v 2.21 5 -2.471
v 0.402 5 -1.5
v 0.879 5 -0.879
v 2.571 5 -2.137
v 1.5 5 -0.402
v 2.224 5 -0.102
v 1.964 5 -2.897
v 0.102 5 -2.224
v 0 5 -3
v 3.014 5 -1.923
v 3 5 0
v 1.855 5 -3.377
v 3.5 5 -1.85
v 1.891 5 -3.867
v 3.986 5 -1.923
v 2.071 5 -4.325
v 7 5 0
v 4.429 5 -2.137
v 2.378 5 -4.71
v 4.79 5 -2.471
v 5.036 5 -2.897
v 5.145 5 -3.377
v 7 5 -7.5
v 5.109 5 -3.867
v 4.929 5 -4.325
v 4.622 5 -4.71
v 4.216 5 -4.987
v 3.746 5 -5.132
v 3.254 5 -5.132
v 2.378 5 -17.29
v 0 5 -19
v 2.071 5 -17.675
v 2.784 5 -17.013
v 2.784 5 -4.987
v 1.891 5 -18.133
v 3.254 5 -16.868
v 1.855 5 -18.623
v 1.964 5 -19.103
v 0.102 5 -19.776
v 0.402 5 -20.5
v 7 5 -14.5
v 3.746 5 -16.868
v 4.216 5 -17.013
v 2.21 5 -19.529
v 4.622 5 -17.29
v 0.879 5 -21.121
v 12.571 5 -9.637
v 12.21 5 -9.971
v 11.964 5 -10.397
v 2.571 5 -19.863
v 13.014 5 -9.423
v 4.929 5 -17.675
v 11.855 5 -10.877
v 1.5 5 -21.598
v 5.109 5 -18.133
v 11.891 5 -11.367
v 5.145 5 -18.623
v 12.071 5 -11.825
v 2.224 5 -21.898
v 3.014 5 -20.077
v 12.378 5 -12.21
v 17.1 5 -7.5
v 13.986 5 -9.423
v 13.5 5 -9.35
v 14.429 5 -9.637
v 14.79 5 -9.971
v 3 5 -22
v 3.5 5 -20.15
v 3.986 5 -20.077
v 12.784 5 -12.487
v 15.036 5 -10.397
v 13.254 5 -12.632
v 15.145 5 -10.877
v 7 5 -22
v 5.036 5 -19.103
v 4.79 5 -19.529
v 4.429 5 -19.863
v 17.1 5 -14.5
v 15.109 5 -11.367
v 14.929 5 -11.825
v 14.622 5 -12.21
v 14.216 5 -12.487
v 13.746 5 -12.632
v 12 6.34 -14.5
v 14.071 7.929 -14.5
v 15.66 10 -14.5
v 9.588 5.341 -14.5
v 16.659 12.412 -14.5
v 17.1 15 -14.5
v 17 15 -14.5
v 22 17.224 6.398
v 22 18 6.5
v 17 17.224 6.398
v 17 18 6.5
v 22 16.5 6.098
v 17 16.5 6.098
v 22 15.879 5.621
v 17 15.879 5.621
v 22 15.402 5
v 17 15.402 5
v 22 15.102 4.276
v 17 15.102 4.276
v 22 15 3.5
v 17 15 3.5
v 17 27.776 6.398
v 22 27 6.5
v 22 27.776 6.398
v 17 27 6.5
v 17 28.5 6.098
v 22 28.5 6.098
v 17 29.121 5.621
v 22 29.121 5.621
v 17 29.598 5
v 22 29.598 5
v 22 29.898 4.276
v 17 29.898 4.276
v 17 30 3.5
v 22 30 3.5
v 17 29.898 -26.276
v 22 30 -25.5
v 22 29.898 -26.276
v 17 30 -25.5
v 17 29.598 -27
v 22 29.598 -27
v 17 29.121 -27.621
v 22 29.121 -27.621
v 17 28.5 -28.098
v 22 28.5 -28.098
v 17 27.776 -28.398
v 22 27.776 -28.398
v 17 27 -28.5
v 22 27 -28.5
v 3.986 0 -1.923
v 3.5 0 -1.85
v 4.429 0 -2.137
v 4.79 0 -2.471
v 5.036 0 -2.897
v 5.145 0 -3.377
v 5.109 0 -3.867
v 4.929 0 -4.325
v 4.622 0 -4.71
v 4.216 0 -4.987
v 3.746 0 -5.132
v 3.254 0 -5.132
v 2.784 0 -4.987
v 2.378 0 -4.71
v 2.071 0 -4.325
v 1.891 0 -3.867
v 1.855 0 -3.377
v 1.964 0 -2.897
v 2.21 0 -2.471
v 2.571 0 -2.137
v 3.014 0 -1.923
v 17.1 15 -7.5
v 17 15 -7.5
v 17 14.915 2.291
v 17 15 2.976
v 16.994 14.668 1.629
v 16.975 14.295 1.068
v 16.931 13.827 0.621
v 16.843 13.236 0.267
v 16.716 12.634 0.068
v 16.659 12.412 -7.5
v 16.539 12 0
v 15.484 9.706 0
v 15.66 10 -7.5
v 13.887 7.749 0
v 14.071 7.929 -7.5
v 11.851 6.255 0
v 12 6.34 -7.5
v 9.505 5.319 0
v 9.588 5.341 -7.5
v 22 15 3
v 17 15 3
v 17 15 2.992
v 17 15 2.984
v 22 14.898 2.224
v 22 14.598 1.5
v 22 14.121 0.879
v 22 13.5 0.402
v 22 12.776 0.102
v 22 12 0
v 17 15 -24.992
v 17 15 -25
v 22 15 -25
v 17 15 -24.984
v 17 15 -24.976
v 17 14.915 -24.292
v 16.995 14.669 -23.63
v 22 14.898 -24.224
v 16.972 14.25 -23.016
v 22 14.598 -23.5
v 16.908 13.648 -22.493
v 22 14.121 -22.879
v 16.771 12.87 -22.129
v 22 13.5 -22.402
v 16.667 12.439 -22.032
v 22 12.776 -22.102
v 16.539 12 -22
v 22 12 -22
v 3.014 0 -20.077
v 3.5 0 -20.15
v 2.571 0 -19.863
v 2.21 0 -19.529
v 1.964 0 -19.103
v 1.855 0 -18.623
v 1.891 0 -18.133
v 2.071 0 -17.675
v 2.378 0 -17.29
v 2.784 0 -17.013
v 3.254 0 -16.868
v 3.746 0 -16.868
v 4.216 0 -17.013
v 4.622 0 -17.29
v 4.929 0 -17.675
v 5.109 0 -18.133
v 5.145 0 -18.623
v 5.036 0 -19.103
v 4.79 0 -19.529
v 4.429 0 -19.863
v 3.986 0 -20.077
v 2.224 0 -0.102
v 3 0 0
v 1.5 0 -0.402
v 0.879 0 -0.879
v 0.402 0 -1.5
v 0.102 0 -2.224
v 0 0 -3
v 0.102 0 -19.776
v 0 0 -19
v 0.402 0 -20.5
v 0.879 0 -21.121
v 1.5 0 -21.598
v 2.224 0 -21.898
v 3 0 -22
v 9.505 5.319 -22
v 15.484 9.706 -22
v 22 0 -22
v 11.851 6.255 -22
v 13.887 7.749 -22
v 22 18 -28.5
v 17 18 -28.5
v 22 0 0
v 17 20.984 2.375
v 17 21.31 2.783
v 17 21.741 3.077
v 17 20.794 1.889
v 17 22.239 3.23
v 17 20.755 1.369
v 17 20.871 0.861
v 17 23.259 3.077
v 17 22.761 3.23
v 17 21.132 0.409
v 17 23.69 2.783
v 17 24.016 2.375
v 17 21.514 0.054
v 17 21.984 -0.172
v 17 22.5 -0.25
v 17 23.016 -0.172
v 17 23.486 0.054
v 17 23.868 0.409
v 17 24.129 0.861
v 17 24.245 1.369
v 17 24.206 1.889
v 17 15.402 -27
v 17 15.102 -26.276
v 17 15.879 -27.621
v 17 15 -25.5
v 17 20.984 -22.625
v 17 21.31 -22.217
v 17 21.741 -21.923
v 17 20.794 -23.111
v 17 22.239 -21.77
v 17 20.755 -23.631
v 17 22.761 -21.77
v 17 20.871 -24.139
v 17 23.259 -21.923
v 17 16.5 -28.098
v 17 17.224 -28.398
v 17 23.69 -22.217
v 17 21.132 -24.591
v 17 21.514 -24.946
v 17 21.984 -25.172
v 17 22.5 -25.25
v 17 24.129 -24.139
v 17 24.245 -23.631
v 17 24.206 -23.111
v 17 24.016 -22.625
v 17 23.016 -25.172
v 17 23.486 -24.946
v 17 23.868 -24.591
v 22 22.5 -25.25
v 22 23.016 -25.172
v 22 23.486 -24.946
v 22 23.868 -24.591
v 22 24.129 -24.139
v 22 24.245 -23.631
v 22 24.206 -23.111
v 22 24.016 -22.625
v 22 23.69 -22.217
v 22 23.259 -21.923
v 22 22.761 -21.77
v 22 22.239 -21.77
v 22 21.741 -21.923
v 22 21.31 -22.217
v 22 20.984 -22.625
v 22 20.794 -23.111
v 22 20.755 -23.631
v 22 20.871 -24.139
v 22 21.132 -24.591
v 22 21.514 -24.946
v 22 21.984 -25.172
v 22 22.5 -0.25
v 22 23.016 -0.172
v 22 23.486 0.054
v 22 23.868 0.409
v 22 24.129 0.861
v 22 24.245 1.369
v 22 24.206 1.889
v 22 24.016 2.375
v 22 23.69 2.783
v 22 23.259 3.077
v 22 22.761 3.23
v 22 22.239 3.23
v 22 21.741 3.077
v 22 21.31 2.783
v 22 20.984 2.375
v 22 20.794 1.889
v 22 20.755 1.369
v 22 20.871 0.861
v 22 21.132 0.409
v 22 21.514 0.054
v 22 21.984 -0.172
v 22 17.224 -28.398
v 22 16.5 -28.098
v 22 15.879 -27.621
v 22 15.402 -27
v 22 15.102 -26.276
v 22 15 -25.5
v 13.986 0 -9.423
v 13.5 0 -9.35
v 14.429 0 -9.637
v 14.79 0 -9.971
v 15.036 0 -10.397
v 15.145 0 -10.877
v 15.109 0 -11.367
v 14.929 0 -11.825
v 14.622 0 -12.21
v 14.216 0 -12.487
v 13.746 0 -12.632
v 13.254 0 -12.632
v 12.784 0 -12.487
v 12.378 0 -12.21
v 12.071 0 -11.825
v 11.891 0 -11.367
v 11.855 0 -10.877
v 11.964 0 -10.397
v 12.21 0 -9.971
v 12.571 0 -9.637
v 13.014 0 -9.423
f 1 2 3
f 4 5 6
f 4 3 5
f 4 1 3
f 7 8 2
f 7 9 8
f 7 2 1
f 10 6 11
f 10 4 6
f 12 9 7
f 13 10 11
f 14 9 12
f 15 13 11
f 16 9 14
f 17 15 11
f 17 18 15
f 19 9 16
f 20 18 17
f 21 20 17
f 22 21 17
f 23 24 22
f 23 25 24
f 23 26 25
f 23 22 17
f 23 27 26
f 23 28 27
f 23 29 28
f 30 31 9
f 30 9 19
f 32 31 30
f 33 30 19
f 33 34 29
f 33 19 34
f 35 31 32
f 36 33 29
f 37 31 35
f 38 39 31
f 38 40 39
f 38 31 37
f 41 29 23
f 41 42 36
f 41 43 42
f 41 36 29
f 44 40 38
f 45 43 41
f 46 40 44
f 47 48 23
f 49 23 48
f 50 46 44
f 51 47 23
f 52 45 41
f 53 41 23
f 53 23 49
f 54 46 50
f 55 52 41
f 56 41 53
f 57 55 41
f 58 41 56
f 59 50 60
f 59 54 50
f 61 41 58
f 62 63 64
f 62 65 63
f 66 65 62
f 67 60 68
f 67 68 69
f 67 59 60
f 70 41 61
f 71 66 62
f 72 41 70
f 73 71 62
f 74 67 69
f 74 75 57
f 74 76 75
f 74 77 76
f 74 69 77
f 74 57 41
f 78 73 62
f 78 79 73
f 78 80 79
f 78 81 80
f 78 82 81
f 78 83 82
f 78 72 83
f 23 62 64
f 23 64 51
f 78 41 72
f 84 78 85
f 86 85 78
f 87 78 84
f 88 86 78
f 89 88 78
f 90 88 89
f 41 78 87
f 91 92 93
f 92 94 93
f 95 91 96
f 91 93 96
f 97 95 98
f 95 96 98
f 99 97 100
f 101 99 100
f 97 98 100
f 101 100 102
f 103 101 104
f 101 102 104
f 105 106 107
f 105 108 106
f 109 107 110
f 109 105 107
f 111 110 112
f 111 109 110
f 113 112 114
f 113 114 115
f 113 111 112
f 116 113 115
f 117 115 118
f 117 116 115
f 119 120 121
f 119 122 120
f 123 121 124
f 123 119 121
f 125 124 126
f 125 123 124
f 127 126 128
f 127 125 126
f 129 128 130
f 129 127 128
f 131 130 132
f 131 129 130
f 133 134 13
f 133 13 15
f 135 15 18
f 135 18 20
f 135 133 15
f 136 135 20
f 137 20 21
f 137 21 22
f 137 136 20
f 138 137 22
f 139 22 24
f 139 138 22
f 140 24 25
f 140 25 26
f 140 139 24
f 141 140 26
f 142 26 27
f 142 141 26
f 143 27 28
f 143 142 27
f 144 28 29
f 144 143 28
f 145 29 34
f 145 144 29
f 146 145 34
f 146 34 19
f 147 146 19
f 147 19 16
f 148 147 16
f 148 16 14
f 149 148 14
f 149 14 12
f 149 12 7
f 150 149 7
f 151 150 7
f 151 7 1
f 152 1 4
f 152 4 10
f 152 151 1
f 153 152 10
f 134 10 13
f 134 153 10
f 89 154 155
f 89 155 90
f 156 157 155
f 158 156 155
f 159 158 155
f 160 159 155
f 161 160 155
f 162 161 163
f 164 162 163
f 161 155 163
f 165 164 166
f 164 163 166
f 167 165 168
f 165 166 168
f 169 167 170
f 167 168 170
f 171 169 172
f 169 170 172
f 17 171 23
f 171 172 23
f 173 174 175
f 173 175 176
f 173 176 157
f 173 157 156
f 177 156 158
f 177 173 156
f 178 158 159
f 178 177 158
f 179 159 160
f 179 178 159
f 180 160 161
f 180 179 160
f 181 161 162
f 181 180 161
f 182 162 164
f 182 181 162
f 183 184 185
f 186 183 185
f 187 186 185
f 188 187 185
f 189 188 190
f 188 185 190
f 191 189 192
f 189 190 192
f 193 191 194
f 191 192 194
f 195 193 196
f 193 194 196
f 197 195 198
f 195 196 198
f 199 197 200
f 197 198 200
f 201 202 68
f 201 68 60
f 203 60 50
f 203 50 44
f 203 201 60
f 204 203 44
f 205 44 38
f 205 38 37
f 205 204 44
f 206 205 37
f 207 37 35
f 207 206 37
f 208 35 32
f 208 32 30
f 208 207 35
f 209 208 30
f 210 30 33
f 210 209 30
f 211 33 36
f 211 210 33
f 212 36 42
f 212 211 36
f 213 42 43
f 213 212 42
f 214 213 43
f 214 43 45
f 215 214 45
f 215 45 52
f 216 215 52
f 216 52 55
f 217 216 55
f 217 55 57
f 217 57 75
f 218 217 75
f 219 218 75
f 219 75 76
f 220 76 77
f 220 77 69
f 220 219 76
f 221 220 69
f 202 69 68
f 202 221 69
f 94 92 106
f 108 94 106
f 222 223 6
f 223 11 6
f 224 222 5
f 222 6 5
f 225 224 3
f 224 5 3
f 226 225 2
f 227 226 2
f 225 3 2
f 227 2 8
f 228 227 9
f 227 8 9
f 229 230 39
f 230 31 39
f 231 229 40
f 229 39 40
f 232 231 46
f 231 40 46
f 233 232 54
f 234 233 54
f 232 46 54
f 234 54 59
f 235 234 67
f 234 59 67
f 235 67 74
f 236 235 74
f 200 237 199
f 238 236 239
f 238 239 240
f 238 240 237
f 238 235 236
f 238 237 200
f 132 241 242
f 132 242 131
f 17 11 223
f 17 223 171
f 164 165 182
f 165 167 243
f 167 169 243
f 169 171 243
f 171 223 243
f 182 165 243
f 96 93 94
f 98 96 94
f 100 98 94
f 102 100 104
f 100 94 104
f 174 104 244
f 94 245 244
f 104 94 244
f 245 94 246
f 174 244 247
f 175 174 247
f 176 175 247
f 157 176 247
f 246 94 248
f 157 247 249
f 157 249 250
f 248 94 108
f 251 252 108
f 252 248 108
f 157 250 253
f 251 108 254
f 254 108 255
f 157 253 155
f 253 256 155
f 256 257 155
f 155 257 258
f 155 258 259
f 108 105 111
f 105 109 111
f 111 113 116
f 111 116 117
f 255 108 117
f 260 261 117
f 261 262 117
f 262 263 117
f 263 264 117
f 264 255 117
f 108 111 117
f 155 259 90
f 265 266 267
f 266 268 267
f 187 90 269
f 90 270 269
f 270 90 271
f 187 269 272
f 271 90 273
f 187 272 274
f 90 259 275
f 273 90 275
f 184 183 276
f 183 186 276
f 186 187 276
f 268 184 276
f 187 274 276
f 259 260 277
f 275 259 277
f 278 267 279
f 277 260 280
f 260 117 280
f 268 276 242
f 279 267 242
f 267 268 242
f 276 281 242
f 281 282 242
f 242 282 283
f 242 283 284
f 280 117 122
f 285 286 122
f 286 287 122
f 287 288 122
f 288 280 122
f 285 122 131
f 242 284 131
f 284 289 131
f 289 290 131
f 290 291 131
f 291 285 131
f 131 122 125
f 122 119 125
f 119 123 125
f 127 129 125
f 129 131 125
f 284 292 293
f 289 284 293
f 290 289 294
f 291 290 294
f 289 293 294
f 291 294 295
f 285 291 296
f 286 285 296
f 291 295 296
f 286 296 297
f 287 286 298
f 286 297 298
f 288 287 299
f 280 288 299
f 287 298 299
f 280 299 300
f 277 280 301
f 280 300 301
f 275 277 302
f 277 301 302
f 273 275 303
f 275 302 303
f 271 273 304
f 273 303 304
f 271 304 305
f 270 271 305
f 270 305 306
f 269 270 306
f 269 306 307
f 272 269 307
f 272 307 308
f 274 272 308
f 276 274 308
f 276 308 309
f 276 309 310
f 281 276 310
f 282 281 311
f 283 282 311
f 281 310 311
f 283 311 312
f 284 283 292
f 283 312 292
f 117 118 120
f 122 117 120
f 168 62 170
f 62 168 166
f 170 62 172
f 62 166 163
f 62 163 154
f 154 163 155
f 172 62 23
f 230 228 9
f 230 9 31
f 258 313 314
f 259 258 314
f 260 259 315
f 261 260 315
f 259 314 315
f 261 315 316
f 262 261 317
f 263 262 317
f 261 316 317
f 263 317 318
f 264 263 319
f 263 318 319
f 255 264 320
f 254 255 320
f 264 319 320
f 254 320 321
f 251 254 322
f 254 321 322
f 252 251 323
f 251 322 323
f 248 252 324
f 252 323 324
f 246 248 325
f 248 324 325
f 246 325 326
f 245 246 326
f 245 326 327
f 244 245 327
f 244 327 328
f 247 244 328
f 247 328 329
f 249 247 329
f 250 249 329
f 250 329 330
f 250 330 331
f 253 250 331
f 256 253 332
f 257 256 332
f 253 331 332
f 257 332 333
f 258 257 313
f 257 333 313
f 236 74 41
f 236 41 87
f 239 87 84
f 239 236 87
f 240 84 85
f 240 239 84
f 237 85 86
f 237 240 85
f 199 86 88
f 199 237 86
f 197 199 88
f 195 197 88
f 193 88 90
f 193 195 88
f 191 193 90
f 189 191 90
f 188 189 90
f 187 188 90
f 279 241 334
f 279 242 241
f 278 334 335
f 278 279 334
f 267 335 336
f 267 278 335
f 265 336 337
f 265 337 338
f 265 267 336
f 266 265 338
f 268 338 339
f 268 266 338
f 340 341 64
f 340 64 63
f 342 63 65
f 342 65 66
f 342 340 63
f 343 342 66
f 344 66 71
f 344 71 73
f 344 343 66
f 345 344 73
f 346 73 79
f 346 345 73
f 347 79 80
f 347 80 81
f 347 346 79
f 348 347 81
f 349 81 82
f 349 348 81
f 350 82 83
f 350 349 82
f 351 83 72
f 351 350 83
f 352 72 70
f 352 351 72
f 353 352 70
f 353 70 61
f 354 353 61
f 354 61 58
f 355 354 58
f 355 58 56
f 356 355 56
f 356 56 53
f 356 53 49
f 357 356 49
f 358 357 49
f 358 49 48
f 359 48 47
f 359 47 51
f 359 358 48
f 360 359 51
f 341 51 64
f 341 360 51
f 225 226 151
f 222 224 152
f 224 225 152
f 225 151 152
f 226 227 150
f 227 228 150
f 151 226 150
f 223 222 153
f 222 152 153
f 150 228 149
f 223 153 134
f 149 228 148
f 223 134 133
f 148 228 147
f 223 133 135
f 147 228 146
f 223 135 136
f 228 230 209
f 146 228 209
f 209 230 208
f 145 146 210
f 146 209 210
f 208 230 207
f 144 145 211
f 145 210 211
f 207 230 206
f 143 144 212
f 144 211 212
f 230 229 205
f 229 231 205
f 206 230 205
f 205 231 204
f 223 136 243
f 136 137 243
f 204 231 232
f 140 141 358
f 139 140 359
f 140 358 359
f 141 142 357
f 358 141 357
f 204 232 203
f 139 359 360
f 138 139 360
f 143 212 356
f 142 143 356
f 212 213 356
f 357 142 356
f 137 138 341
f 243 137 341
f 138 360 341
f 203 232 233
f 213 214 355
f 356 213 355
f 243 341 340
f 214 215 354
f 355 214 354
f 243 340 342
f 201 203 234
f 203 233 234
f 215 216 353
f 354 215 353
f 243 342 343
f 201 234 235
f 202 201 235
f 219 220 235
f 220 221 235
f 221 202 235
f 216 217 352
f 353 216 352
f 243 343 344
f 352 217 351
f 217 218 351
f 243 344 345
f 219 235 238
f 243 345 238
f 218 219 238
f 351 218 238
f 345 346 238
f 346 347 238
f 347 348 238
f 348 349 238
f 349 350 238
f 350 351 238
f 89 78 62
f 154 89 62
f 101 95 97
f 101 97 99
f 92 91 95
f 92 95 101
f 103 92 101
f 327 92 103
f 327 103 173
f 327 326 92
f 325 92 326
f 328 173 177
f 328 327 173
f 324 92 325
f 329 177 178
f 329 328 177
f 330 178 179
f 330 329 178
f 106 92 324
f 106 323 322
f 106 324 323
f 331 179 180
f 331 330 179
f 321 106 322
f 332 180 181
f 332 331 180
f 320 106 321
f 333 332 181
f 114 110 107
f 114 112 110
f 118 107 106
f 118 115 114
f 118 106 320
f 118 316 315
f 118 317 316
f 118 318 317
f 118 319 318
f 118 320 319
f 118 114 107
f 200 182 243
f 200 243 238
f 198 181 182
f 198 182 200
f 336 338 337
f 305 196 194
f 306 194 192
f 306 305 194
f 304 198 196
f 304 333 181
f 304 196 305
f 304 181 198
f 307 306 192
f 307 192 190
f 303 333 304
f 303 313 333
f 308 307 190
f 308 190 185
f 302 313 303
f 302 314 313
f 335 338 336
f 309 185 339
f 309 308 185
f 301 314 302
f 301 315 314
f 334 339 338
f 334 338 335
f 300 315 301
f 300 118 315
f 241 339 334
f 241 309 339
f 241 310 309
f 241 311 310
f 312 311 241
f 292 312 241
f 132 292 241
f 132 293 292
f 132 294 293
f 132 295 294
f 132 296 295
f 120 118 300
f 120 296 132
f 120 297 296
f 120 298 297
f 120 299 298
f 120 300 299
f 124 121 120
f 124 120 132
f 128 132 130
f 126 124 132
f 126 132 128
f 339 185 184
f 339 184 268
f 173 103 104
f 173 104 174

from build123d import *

# Parameters (mm, degrees)
SKETCH1_W                = 22
SKETCH1_H                = 22
SKETCH1_R                = 1.65
BOSS_EXTRUDE1_DEPTH      = 5
SKETCH2_W                = 5
SKETCH2_H                = 22
BOSS_EXTRUDE2_DEPTH      = 10
SKETCH3_W                = 7
SKETCH3_H                = 10
CUT_EXTRUDE1_DEPTH       = 0.1
FILLET1_R                = 10
SKETCH5_W                = 35
SKETCH5_H                = 15
SKETCH5_R                = 1.75
CHANGE_THIS_SKETCH_DEPTH = 5
FILLET2_R                = 3


with BuildPart() as part:
    # Sketch1 → Boss-Extrude1 (new body)
    with BuildSketch(Plane(origin=(0, 0, 0), x_dir=(1, 0, 0), z_dir=(0, 1, 0))):
        with Locations((11, 11)):
            Rectangle(SKETCH1_W, SKETCH1_H)
        with Locations(Location((13.5, 11, 0), (0, 0, 270))):
            Circle(SKETCH1_R, mode=Mode.SUBTRACT)
        with Locations(Location((3.5, 3.5, 0), (0, 0, 270))):
            Circle(SKETCH1_R, mode=Mode.SUBTRACT)
        with Locations(Location((3.5, 18.5, 0), (0, 0, 90))):
            Circle(SKETCH1_R, mode=Mode.SUBTRACT)
    extrude(amount=BOSS_EXTRUDE1_DEPTH)

    # Sketch2 → Boss-Extrude2 (add)
    with BuildSketch(Plane(origin=(0, 5, 0), x_dir=(1, 0, 0), z_dir=(0, 1, 0))):
        with Locations((19.5, 11)):
            Rectangle(SKETCH2_W, SKETCH2_H)
    extrude(amount=BOSS_EXTRUDE2_DEPTH)

    # Sketch3 → Cut-Extrude1 (cut)
    with BuildSketch(Plane.ZY.offset(-17)):
        with Locations((-11, 10)):
            Rectangle(SKETCH3_W, SKETCH3_H)
    extrude(amount=-CUT_EXTRUDE1_DEPTH, mode=Mode.SUBTRACT)

    # Fillet1
    fillet1_edges = [part.edges().sort_by_distance(p)[0] for p in [
        (17, 5, -18.25),
        (17, 5, -3.75),
    ]]
    fillet(fillet1_edges, radius=FILLET1_R - 0.0001)  # a hair under: the kernel refuses the full size

    # Sketch5 → CHANGE THIS SKETCH (add)
    with BuildSketch(Plane(origin=(22, 0, 0), x_dir=(0, 0, -1), z_dir=(1, 0, 0))):
        with Locations((11, 22.5)):
            Rectangle(SKETCH5_W, SKETCH5_H)
        with Locations((23.5, 22.5)):
            Circle(SKETCH5_R, mode=Mode.SUBTRACT)
        with Locations((-1.5, 22.5)):
            Circle(SKETCH5_R, mode=Mode.SUBTRACT)
    extrude(amount=-CHANGE_THIS_SKETCH_DEPTH)

    # Fillet2
    fillet2_edges = [part.edges().sort_by_distance(p)[0] for p in [
        (19.5, 15, -22),
        (19.5, 15, 0),
        (0, 2.5, -22),
        (19.5, 15, 6.5),
        (19.5, 30, 6.5),
        (19.5, 30, -28.5),
        (19.5, 15, -28.5),
        (0, 2.5, 0),
    ]]
    fillet(fillet2_edges, radius=FILLET2_R)


solid = part.part
